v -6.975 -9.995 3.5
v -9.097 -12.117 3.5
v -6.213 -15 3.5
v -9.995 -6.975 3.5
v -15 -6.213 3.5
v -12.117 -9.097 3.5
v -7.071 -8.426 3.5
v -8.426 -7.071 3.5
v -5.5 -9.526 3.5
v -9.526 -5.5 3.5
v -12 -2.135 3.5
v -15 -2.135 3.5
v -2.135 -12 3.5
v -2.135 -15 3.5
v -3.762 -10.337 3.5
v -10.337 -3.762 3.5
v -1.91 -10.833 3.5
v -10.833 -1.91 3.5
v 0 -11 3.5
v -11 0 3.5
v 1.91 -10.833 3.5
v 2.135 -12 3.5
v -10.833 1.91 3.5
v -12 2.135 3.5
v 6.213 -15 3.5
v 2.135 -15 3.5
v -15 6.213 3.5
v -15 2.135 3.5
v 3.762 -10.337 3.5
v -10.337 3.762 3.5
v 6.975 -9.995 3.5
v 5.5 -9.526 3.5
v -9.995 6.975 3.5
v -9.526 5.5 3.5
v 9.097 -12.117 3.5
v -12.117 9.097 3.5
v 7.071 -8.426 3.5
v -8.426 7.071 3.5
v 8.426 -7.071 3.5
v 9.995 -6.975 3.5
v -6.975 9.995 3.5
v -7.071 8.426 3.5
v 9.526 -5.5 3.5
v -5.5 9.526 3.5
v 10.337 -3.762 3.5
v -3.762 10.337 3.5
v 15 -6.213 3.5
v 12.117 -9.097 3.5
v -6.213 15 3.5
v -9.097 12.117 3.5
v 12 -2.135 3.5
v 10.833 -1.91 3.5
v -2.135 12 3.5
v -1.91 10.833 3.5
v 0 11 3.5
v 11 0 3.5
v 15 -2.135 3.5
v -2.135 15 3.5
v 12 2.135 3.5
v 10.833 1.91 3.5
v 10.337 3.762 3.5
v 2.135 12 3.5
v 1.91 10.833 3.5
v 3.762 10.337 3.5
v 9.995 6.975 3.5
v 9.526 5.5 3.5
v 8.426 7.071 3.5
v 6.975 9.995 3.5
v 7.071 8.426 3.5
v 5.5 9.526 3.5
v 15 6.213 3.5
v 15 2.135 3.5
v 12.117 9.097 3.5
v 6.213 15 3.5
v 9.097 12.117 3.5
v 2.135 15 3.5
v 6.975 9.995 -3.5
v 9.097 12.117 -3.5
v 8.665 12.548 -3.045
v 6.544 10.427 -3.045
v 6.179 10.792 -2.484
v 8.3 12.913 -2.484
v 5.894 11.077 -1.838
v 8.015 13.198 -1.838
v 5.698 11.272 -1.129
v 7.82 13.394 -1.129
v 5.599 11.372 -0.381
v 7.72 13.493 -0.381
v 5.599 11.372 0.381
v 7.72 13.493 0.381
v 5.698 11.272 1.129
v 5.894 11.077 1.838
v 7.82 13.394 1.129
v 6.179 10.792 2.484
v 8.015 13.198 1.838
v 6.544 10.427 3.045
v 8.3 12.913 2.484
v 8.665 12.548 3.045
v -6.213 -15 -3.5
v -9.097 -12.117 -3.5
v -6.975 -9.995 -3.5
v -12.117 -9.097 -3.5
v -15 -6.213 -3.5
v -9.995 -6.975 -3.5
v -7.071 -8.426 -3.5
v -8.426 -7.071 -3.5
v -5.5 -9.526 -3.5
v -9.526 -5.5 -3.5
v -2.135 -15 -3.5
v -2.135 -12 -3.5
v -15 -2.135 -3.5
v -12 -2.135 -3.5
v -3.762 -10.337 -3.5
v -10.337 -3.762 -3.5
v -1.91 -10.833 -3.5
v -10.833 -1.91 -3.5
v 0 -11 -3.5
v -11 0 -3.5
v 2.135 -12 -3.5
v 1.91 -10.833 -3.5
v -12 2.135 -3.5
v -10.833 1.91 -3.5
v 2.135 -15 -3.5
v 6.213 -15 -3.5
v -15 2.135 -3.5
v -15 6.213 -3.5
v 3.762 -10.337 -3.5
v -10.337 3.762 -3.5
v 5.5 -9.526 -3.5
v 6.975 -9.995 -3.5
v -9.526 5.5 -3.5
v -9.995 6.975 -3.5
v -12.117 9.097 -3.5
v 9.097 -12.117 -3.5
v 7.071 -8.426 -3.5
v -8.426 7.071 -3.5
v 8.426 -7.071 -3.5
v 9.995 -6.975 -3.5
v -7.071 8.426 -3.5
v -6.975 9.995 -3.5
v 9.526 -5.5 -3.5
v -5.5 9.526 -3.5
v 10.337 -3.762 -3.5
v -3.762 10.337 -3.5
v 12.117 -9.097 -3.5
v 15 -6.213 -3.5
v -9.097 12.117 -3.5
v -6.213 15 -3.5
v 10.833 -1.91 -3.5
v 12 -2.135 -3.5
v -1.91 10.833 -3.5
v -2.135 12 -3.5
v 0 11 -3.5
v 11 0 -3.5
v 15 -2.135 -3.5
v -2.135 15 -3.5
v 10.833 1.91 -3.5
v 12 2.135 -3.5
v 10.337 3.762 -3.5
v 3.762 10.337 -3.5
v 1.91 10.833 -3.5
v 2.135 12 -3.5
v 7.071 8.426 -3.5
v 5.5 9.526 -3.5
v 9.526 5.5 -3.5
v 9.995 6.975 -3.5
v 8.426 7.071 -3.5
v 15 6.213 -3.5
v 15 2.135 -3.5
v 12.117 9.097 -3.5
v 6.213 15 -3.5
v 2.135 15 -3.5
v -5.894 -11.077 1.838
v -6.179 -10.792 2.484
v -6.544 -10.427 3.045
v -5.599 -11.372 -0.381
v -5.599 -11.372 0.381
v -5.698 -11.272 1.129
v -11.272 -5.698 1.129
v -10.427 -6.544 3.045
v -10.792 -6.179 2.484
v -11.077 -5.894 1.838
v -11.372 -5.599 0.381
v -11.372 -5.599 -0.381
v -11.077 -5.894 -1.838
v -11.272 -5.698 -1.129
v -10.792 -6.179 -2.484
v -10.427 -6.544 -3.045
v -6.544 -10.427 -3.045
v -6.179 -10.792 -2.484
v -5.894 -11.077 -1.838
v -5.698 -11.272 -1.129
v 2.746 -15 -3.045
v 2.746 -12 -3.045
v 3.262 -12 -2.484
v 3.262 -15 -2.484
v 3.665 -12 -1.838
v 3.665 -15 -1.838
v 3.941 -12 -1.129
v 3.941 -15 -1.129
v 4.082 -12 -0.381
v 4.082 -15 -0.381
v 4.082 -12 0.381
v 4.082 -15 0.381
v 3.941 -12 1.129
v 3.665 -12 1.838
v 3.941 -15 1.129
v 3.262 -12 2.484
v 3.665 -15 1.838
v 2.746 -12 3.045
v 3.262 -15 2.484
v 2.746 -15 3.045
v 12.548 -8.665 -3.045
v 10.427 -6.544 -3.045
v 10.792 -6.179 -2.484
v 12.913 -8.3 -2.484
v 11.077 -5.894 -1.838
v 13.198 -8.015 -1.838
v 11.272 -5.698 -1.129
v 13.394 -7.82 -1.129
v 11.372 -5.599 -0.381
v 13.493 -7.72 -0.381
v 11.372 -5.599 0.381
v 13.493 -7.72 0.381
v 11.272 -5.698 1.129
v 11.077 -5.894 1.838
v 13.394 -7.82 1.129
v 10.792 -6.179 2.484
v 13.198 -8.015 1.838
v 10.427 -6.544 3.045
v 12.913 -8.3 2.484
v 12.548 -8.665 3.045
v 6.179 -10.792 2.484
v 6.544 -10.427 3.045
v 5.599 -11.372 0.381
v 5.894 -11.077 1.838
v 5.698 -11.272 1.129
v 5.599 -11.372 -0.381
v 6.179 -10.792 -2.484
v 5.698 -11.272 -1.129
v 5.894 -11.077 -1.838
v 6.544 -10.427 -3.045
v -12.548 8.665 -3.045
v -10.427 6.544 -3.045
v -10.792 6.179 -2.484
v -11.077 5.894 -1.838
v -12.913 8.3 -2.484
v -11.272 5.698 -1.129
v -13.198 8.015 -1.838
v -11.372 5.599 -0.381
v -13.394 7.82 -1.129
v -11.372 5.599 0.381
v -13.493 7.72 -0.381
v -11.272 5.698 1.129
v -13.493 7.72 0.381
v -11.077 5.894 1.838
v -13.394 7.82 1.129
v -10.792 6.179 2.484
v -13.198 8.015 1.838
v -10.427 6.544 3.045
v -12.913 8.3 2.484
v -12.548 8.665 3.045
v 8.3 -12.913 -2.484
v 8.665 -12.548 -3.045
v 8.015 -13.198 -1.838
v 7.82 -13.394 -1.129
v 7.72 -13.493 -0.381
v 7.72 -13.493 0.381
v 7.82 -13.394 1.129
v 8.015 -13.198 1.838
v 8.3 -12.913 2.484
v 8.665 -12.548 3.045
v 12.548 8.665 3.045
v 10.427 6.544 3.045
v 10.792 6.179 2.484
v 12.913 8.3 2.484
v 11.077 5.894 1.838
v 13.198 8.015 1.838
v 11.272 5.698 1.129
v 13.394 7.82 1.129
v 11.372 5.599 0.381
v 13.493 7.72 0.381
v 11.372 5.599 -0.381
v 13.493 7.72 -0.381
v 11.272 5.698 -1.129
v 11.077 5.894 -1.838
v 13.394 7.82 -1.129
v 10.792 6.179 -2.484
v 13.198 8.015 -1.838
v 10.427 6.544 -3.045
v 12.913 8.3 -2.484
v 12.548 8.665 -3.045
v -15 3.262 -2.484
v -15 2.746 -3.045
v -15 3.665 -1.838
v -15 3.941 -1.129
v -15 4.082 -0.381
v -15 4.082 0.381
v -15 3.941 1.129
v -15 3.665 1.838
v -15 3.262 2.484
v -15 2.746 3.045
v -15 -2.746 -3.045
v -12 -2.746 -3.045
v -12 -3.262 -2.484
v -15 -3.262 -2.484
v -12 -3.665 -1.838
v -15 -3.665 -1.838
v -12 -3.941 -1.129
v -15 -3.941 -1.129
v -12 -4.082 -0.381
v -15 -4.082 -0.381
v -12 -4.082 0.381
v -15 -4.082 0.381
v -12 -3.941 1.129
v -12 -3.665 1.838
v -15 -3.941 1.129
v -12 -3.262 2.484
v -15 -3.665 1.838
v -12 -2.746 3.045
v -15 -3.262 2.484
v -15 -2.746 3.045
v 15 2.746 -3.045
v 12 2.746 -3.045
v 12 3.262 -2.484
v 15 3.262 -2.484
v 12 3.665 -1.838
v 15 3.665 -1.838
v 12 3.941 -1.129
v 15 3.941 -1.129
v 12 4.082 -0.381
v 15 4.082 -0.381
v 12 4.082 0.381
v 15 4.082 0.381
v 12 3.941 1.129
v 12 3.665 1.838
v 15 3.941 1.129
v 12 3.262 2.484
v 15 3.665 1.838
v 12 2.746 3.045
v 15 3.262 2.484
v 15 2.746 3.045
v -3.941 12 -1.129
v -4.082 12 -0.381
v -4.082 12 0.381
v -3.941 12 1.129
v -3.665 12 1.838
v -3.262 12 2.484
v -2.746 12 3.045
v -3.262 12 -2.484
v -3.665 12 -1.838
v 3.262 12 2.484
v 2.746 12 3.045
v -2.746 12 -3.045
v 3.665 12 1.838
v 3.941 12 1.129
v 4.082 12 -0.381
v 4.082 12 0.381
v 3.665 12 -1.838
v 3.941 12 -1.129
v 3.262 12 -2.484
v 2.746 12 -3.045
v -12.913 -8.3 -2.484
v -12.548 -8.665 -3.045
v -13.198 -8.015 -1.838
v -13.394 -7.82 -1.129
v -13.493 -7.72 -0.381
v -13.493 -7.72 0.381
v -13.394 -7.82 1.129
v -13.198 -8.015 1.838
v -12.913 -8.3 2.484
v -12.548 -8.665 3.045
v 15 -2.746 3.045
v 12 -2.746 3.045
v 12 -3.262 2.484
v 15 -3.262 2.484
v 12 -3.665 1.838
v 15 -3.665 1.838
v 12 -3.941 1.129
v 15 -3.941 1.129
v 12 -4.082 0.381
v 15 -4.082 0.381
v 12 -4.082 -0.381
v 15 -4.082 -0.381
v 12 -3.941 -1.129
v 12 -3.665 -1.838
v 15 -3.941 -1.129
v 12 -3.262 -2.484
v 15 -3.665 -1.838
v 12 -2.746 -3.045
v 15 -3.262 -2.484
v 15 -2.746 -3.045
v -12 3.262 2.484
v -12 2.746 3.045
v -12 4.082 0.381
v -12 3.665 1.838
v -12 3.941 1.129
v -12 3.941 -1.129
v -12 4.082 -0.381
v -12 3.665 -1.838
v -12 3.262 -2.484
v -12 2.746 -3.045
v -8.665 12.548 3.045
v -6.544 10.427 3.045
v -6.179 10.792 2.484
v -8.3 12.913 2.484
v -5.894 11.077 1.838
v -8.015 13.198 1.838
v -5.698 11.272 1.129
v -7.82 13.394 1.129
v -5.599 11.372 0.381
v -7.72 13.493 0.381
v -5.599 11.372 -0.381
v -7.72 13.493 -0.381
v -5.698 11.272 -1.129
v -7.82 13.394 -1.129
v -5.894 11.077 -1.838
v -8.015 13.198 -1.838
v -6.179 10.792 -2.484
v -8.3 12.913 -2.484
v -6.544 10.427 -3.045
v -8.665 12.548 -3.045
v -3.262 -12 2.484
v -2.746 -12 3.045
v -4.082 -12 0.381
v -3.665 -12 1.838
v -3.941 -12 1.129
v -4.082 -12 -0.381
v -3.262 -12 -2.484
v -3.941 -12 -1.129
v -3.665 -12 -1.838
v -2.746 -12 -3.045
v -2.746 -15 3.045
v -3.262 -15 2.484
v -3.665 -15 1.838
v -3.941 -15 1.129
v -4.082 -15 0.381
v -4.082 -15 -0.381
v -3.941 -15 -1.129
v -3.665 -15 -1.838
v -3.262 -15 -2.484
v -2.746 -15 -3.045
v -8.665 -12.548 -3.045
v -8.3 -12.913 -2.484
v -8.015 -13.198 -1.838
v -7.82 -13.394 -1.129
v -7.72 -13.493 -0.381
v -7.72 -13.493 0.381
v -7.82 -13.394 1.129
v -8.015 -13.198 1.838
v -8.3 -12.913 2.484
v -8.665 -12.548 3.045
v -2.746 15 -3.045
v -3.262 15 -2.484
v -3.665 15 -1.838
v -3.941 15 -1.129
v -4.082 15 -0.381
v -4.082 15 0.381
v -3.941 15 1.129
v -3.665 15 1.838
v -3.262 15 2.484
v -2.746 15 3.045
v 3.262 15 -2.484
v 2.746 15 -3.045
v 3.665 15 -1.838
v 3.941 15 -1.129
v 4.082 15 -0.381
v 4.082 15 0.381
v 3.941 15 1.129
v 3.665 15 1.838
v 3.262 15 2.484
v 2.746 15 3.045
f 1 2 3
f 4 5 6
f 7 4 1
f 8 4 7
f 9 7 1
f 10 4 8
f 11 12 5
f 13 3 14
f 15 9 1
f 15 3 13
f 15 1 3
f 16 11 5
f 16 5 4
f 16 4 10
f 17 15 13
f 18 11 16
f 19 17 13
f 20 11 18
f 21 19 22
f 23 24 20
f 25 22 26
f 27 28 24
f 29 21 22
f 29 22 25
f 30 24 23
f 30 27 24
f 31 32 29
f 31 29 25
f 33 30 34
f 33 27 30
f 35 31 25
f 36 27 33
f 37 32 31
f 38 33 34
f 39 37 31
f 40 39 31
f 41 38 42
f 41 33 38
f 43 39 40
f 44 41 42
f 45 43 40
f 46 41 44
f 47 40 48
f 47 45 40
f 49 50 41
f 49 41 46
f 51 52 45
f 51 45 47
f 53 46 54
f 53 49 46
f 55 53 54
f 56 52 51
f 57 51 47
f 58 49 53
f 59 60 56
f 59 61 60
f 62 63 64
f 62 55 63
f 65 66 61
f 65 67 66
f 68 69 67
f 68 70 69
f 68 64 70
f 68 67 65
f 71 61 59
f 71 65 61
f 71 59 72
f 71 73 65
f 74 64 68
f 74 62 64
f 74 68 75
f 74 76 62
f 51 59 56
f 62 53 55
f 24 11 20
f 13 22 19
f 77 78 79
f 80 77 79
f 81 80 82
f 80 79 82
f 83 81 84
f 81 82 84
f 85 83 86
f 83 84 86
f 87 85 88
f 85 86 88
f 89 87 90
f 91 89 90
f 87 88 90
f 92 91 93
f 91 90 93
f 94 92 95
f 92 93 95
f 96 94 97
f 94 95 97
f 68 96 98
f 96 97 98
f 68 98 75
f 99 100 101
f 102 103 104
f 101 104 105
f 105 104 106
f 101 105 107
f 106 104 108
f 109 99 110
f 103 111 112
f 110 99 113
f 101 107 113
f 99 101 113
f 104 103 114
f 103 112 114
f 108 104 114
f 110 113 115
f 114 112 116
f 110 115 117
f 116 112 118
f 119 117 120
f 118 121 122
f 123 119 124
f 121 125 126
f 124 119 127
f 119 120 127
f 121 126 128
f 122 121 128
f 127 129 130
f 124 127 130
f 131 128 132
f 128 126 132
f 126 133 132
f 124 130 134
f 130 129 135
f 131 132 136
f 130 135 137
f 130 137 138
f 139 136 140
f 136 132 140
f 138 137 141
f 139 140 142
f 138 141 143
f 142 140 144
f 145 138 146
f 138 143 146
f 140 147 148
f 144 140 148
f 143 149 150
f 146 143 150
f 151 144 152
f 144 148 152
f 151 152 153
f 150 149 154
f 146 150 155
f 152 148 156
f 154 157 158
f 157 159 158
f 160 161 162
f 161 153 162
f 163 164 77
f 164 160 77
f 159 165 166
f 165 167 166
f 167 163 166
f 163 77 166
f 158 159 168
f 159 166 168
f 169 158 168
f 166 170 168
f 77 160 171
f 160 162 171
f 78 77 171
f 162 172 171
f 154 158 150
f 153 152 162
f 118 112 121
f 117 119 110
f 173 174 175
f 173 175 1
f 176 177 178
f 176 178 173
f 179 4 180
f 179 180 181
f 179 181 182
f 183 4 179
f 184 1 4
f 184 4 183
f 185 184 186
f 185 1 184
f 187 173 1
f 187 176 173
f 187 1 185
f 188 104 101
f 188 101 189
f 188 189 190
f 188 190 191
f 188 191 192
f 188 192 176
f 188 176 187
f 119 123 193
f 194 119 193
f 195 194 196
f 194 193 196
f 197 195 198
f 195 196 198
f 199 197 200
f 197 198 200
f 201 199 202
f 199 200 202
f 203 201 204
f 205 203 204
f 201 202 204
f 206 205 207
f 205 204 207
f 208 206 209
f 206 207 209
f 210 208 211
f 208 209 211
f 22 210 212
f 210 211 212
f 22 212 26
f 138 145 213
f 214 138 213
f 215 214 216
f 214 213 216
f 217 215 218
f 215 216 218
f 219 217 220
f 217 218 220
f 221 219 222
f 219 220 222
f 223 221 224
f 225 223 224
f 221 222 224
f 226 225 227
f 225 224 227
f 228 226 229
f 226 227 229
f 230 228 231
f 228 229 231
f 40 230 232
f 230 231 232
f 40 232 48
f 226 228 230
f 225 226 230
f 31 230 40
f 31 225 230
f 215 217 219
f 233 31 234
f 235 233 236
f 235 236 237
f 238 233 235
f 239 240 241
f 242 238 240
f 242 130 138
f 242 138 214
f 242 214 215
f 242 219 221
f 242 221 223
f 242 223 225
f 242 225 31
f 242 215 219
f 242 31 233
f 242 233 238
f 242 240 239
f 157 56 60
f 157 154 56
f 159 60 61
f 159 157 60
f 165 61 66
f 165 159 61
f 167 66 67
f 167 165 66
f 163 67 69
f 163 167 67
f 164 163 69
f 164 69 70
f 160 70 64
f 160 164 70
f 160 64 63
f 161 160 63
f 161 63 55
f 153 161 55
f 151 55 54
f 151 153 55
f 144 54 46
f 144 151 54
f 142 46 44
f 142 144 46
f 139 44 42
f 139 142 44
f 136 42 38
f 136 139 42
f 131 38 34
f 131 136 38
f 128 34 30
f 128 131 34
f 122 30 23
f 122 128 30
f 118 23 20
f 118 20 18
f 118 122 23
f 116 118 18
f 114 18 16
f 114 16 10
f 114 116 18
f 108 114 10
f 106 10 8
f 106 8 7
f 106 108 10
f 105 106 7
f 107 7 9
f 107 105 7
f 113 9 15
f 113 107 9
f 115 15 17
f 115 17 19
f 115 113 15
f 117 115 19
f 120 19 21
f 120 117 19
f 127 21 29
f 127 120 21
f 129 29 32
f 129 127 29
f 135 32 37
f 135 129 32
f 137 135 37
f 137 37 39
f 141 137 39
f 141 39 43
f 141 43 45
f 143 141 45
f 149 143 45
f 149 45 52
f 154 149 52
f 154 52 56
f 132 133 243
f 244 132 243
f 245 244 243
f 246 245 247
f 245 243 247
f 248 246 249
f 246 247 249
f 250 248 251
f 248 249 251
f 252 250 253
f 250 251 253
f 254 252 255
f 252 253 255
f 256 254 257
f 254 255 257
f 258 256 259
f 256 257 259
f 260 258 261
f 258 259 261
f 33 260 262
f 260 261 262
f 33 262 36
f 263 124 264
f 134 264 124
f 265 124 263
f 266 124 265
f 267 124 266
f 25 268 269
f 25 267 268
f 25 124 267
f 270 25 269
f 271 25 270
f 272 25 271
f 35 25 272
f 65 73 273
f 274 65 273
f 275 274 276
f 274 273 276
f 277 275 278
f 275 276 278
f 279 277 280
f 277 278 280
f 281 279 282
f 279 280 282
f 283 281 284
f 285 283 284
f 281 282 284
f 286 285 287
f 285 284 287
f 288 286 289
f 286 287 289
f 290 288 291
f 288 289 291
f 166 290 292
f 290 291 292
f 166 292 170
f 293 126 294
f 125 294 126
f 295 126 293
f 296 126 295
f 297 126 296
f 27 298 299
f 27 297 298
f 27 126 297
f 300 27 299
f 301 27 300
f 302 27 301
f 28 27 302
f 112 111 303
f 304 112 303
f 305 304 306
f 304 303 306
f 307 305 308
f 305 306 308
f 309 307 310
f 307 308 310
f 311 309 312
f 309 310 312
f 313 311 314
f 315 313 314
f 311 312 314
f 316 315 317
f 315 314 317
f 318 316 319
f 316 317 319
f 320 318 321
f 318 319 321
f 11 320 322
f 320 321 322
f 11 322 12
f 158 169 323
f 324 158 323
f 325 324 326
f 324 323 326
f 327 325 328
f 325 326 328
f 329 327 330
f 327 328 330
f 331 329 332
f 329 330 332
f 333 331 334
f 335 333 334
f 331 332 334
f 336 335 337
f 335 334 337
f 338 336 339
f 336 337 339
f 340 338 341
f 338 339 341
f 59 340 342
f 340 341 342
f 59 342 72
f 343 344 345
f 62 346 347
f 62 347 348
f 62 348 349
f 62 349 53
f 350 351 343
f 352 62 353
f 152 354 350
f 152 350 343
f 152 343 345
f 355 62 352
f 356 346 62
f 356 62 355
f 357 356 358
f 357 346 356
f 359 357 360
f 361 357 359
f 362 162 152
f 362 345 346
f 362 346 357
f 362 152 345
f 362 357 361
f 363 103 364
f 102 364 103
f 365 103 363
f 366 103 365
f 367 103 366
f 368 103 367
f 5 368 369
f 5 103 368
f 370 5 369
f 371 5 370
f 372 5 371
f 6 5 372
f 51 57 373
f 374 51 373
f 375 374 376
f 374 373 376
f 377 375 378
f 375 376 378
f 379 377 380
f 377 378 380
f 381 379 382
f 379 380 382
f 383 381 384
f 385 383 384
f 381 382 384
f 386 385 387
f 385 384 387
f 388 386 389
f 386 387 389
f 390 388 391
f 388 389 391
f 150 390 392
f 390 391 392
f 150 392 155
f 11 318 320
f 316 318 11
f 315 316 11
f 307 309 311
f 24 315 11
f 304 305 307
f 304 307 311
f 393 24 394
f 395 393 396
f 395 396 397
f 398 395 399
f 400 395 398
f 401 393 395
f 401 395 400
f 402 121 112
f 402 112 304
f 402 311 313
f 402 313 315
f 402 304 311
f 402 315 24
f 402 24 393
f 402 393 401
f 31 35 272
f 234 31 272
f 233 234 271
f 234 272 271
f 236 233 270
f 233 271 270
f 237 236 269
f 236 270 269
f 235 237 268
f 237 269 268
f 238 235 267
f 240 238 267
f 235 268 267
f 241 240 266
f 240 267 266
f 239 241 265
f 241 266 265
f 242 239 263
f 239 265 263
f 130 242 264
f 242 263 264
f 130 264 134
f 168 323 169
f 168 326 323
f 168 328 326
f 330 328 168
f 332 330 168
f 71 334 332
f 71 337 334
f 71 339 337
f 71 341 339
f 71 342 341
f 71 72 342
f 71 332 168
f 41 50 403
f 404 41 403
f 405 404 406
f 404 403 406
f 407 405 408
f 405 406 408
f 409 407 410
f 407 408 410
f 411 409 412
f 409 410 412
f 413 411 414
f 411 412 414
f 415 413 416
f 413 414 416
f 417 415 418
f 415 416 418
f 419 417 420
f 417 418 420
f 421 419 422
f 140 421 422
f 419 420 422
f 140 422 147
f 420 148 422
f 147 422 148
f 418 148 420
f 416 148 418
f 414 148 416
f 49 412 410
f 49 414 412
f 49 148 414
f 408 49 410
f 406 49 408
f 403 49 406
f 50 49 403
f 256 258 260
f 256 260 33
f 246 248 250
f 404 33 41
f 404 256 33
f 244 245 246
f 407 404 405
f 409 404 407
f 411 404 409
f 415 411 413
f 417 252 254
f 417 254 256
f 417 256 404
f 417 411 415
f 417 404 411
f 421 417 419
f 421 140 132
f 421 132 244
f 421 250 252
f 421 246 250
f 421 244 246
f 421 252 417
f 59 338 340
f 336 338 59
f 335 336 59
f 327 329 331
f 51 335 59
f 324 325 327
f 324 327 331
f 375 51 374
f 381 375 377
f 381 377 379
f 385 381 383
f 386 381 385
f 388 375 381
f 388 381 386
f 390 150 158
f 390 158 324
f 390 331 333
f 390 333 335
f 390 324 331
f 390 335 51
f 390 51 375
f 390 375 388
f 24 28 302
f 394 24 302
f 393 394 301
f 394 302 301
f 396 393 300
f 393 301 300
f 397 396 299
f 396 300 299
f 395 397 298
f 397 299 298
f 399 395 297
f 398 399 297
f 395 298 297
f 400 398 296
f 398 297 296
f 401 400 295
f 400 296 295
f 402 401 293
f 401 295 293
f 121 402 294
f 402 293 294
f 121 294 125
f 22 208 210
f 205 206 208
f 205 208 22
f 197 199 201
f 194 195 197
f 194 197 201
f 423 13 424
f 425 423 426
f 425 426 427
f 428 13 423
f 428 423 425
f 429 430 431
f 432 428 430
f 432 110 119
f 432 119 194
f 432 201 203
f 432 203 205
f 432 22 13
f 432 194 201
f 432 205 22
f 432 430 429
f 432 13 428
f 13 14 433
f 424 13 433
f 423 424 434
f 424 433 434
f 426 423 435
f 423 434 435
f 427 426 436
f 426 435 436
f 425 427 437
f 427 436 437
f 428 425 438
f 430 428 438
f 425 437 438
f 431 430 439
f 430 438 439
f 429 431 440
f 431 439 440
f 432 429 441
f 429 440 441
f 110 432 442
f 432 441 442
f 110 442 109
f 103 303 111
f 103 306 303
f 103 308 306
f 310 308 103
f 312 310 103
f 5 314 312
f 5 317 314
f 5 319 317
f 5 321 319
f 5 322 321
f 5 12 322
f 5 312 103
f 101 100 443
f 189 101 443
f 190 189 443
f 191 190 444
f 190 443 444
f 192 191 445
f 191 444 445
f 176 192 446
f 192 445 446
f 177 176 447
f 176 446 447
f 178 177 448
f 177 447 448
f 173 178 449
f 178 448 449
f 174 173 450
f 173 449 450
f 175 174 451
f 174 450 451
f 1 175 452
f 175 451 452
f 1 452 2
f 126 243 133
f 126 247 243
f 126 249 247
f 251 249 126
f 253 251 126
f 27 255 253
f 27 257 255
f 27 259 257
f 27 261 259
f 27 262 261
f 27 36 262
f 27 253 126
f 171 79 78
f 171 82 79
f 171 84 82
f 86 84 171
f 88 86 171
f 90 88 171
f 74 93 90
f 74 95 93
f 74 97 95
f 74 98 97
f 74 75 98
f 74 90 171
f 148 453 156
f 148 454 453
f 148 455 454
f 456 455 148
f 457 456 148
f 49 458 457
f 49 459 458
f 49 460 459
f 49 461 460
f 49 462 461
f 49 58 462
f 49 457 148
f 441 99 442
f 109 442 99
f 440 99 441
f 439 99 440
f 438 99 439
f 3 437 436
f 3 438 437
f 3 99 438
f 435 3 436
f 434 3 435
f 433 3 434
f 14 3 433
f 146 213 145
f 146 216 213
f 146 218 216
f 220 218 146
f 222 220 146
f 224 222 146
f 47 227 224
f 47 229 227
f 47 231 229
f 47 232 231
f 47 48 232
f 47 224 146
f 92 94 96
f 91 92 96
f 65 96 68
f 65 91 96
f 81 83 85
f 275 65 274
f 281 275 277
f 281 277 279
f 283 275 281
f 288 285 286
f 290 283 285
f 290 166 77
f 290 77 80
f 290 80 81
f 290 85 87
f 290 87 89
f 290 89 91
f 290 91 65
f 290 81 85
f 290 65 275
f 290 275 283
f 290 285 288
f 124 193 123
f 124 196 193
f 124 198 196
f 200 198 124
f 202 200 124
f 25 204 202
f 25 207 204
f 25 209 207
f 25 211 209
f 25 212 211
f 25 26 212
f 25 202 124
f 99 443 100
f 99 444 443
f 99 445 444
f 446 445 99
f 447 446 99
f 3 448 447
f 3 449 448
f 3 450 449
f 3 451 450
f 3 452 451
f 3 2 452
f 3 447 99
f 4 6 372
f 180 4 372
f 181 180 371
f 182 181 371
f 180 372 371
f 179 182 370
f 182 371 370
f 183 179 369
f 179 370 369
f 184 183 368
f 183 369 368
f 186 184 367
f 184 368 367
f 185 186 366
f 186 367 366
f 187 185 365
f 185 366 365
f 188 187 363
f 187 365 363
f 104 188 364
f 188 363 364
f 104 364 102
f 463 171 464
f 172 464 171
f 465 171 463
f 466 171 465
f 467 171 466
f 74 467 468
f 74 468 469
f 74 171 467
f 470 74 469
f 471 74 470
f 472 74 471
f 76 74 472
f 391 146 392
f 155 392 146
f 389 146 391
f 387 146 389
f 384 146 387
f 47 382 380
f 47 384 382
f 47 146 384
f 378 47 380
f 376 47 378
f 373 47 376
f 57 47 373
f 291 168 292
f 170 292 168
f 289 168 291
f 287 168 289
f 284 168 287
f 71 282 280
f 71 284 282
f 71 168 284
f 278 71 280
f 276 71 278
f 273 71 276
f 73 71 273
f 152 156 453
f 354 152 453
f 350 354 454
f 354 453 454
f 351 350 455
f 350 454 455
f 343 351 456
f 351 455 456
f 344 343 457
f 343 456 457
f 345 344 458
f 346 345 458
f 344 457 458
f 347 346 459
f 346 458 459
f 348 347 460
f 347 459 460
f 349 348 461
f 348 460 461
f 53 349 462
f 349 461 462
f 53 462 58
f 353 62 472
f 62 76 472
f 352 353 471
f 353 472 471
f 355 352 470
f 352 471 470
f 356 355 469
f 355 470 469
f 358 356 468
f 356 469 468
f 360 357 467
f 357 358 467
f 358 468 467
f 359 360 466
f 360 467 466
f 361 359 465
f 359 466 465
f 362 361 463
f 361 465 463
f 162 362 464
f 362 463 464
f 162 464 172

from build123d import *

# Parameters (mm, degrees)
SKETCH1_R           = 11
BOSS_EXTRUDE1_DEPTH = 3.5
SKETCH2_R           = 4.1
CUT_EXTRUDE3_DEPTH  = 3
CIRPATTERN1_COUNT   = 8


with BuildPart() as part:
    # Sketch1 → Boss-Extrude1 (new, symmetric)
    with BuildSketch(Plane.XY):
        Polygon((6.213203436, 15), (-6.213203436, 15), (-15, 6.213203436), (-15, -6.213203436), (-6.213203436, -15), (6.213203436, -15), (15, -6.213203436), (15, 6.213203436), align=None)
        Circle(SKETCH1_R, mode=Mode.SUBTRACT)
    extrude(amount=BOSS_EXTRUDE1_DEPTH, both=True)

    # Sketch2 → Cut-Extrude3 (cut)
    with BuildSketch(Plane(origin=(0, -15, 0), x_dir=(-1, 0, 0), z_dir=(0, -1, 0))):
        Circle(SKETCH2_R)
    cut_extrude3 = extrude(amount=-CUT_EXTRUDE3_DEPTH, mode=Mode.SUBTRACT)

    # CirPattern1: Cut-Extrude3 ×8 about axis
    cirpattern1_axis = Axis((0, 0, 3.5), (0, 0, 1))
    for i in range(1, CIRPATTERN1_COUNT):
        add(cut_extrude3.rotate(cirpattern1_axis, i * 360 / CIRPATTERN1_COUNT), mode=Mode.SUBTRACT)


solid = part.part
